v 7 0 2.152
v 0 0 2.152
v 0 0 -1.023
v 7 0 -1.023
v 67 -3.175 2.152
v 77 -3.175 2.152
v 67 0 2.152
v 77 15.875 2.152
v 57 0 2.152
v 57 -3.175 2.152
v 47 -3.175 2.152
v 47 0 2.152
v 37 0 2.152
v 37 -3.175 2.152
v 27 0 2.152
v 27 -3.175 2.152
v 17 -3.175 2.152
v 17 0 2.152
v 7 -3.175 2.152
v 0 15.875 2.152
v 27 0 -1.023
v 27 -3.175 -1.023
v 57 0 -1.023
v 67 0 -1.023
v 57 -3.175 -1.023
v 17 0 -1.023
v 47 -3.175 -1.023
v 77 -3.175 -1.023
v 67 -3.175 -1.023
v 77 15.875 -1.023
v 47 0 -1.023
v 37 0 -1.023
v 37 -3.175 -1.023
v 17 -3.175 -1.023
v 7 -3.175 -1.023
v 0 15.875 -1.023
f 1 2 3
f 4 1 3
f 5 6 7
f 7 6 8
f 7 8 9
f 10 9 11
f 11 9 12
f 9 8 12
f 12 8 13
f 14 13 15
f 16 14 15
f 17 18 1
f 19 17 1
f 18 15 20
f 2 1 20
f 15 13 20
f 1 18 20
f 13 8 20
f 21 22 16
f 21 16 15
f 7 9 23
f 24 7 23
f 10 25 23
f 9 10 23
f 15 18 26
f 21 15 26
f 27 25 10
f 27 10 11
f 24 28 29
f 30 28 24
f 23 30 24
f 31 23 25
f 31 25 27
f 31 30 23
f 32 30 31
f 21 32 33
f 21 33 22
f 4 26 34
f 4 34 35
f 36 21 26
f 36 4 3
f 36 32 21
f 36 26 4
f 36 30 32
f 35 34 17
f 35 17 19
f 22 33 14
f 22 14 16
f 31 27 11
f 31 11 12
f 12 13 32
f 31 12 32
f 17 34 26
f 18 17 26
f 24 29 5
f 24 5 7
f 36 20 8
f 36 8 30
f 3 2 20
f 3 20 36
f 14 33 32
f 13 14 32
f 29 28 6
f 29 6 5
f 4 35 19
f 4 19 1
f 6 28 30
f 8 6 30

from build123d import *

# Parameters (mm, degrees)
SKETCH1_W           = 3.175
SKETCH1_H           = 15.875
BOSS_EXTRUDE1_DEPTH = 77
SKETCH2_W           = 10
SKETCH2_H           = 3.175
BOSS_EXTRUDE2_DEPTH = 3.175


with BuildPart() as part:
    # Sketch1 → Boss-Extrude1 (new body)
    with BuildSketch(Plane(origin=(0, 0, 0), x_dir=(0, 0, -1), z_dir=(1, 0, 0))):
        with Locations((-0.564444444, 7.9375)):
            Rectangle(SKETCH1_W, SKETCH1_H)
    extrude(amount=BOSS_EXTRUDE1_DEPTH)

    # Sketch2 → Boss-Extrude2 (add)
    with BuildSketch(Plane(origin=(0, 0, -1.023055556), x_dir=(-1, 0, 0), z_dir=(0, 0, -1))):
        with Locations((-52, -1.5875)):
            Rectangle(SKETCH2_W, SKETCH2_H)
        with Locations((-72, -1.5875)):
            Rectangle(SKETCH2_W, SKETCH2_H)
        with Locations((-32, -1.5875)):
            Rectangle(SKETCH2_W, SKETCH2_H)
        with Locations((-12, -1.5875)):
            Rectangle(SKETCH2_W, SKETCH2_H)
    extrude(amount=-BOSS_EXTRUDE2_DEPTH)


solid = part.part
